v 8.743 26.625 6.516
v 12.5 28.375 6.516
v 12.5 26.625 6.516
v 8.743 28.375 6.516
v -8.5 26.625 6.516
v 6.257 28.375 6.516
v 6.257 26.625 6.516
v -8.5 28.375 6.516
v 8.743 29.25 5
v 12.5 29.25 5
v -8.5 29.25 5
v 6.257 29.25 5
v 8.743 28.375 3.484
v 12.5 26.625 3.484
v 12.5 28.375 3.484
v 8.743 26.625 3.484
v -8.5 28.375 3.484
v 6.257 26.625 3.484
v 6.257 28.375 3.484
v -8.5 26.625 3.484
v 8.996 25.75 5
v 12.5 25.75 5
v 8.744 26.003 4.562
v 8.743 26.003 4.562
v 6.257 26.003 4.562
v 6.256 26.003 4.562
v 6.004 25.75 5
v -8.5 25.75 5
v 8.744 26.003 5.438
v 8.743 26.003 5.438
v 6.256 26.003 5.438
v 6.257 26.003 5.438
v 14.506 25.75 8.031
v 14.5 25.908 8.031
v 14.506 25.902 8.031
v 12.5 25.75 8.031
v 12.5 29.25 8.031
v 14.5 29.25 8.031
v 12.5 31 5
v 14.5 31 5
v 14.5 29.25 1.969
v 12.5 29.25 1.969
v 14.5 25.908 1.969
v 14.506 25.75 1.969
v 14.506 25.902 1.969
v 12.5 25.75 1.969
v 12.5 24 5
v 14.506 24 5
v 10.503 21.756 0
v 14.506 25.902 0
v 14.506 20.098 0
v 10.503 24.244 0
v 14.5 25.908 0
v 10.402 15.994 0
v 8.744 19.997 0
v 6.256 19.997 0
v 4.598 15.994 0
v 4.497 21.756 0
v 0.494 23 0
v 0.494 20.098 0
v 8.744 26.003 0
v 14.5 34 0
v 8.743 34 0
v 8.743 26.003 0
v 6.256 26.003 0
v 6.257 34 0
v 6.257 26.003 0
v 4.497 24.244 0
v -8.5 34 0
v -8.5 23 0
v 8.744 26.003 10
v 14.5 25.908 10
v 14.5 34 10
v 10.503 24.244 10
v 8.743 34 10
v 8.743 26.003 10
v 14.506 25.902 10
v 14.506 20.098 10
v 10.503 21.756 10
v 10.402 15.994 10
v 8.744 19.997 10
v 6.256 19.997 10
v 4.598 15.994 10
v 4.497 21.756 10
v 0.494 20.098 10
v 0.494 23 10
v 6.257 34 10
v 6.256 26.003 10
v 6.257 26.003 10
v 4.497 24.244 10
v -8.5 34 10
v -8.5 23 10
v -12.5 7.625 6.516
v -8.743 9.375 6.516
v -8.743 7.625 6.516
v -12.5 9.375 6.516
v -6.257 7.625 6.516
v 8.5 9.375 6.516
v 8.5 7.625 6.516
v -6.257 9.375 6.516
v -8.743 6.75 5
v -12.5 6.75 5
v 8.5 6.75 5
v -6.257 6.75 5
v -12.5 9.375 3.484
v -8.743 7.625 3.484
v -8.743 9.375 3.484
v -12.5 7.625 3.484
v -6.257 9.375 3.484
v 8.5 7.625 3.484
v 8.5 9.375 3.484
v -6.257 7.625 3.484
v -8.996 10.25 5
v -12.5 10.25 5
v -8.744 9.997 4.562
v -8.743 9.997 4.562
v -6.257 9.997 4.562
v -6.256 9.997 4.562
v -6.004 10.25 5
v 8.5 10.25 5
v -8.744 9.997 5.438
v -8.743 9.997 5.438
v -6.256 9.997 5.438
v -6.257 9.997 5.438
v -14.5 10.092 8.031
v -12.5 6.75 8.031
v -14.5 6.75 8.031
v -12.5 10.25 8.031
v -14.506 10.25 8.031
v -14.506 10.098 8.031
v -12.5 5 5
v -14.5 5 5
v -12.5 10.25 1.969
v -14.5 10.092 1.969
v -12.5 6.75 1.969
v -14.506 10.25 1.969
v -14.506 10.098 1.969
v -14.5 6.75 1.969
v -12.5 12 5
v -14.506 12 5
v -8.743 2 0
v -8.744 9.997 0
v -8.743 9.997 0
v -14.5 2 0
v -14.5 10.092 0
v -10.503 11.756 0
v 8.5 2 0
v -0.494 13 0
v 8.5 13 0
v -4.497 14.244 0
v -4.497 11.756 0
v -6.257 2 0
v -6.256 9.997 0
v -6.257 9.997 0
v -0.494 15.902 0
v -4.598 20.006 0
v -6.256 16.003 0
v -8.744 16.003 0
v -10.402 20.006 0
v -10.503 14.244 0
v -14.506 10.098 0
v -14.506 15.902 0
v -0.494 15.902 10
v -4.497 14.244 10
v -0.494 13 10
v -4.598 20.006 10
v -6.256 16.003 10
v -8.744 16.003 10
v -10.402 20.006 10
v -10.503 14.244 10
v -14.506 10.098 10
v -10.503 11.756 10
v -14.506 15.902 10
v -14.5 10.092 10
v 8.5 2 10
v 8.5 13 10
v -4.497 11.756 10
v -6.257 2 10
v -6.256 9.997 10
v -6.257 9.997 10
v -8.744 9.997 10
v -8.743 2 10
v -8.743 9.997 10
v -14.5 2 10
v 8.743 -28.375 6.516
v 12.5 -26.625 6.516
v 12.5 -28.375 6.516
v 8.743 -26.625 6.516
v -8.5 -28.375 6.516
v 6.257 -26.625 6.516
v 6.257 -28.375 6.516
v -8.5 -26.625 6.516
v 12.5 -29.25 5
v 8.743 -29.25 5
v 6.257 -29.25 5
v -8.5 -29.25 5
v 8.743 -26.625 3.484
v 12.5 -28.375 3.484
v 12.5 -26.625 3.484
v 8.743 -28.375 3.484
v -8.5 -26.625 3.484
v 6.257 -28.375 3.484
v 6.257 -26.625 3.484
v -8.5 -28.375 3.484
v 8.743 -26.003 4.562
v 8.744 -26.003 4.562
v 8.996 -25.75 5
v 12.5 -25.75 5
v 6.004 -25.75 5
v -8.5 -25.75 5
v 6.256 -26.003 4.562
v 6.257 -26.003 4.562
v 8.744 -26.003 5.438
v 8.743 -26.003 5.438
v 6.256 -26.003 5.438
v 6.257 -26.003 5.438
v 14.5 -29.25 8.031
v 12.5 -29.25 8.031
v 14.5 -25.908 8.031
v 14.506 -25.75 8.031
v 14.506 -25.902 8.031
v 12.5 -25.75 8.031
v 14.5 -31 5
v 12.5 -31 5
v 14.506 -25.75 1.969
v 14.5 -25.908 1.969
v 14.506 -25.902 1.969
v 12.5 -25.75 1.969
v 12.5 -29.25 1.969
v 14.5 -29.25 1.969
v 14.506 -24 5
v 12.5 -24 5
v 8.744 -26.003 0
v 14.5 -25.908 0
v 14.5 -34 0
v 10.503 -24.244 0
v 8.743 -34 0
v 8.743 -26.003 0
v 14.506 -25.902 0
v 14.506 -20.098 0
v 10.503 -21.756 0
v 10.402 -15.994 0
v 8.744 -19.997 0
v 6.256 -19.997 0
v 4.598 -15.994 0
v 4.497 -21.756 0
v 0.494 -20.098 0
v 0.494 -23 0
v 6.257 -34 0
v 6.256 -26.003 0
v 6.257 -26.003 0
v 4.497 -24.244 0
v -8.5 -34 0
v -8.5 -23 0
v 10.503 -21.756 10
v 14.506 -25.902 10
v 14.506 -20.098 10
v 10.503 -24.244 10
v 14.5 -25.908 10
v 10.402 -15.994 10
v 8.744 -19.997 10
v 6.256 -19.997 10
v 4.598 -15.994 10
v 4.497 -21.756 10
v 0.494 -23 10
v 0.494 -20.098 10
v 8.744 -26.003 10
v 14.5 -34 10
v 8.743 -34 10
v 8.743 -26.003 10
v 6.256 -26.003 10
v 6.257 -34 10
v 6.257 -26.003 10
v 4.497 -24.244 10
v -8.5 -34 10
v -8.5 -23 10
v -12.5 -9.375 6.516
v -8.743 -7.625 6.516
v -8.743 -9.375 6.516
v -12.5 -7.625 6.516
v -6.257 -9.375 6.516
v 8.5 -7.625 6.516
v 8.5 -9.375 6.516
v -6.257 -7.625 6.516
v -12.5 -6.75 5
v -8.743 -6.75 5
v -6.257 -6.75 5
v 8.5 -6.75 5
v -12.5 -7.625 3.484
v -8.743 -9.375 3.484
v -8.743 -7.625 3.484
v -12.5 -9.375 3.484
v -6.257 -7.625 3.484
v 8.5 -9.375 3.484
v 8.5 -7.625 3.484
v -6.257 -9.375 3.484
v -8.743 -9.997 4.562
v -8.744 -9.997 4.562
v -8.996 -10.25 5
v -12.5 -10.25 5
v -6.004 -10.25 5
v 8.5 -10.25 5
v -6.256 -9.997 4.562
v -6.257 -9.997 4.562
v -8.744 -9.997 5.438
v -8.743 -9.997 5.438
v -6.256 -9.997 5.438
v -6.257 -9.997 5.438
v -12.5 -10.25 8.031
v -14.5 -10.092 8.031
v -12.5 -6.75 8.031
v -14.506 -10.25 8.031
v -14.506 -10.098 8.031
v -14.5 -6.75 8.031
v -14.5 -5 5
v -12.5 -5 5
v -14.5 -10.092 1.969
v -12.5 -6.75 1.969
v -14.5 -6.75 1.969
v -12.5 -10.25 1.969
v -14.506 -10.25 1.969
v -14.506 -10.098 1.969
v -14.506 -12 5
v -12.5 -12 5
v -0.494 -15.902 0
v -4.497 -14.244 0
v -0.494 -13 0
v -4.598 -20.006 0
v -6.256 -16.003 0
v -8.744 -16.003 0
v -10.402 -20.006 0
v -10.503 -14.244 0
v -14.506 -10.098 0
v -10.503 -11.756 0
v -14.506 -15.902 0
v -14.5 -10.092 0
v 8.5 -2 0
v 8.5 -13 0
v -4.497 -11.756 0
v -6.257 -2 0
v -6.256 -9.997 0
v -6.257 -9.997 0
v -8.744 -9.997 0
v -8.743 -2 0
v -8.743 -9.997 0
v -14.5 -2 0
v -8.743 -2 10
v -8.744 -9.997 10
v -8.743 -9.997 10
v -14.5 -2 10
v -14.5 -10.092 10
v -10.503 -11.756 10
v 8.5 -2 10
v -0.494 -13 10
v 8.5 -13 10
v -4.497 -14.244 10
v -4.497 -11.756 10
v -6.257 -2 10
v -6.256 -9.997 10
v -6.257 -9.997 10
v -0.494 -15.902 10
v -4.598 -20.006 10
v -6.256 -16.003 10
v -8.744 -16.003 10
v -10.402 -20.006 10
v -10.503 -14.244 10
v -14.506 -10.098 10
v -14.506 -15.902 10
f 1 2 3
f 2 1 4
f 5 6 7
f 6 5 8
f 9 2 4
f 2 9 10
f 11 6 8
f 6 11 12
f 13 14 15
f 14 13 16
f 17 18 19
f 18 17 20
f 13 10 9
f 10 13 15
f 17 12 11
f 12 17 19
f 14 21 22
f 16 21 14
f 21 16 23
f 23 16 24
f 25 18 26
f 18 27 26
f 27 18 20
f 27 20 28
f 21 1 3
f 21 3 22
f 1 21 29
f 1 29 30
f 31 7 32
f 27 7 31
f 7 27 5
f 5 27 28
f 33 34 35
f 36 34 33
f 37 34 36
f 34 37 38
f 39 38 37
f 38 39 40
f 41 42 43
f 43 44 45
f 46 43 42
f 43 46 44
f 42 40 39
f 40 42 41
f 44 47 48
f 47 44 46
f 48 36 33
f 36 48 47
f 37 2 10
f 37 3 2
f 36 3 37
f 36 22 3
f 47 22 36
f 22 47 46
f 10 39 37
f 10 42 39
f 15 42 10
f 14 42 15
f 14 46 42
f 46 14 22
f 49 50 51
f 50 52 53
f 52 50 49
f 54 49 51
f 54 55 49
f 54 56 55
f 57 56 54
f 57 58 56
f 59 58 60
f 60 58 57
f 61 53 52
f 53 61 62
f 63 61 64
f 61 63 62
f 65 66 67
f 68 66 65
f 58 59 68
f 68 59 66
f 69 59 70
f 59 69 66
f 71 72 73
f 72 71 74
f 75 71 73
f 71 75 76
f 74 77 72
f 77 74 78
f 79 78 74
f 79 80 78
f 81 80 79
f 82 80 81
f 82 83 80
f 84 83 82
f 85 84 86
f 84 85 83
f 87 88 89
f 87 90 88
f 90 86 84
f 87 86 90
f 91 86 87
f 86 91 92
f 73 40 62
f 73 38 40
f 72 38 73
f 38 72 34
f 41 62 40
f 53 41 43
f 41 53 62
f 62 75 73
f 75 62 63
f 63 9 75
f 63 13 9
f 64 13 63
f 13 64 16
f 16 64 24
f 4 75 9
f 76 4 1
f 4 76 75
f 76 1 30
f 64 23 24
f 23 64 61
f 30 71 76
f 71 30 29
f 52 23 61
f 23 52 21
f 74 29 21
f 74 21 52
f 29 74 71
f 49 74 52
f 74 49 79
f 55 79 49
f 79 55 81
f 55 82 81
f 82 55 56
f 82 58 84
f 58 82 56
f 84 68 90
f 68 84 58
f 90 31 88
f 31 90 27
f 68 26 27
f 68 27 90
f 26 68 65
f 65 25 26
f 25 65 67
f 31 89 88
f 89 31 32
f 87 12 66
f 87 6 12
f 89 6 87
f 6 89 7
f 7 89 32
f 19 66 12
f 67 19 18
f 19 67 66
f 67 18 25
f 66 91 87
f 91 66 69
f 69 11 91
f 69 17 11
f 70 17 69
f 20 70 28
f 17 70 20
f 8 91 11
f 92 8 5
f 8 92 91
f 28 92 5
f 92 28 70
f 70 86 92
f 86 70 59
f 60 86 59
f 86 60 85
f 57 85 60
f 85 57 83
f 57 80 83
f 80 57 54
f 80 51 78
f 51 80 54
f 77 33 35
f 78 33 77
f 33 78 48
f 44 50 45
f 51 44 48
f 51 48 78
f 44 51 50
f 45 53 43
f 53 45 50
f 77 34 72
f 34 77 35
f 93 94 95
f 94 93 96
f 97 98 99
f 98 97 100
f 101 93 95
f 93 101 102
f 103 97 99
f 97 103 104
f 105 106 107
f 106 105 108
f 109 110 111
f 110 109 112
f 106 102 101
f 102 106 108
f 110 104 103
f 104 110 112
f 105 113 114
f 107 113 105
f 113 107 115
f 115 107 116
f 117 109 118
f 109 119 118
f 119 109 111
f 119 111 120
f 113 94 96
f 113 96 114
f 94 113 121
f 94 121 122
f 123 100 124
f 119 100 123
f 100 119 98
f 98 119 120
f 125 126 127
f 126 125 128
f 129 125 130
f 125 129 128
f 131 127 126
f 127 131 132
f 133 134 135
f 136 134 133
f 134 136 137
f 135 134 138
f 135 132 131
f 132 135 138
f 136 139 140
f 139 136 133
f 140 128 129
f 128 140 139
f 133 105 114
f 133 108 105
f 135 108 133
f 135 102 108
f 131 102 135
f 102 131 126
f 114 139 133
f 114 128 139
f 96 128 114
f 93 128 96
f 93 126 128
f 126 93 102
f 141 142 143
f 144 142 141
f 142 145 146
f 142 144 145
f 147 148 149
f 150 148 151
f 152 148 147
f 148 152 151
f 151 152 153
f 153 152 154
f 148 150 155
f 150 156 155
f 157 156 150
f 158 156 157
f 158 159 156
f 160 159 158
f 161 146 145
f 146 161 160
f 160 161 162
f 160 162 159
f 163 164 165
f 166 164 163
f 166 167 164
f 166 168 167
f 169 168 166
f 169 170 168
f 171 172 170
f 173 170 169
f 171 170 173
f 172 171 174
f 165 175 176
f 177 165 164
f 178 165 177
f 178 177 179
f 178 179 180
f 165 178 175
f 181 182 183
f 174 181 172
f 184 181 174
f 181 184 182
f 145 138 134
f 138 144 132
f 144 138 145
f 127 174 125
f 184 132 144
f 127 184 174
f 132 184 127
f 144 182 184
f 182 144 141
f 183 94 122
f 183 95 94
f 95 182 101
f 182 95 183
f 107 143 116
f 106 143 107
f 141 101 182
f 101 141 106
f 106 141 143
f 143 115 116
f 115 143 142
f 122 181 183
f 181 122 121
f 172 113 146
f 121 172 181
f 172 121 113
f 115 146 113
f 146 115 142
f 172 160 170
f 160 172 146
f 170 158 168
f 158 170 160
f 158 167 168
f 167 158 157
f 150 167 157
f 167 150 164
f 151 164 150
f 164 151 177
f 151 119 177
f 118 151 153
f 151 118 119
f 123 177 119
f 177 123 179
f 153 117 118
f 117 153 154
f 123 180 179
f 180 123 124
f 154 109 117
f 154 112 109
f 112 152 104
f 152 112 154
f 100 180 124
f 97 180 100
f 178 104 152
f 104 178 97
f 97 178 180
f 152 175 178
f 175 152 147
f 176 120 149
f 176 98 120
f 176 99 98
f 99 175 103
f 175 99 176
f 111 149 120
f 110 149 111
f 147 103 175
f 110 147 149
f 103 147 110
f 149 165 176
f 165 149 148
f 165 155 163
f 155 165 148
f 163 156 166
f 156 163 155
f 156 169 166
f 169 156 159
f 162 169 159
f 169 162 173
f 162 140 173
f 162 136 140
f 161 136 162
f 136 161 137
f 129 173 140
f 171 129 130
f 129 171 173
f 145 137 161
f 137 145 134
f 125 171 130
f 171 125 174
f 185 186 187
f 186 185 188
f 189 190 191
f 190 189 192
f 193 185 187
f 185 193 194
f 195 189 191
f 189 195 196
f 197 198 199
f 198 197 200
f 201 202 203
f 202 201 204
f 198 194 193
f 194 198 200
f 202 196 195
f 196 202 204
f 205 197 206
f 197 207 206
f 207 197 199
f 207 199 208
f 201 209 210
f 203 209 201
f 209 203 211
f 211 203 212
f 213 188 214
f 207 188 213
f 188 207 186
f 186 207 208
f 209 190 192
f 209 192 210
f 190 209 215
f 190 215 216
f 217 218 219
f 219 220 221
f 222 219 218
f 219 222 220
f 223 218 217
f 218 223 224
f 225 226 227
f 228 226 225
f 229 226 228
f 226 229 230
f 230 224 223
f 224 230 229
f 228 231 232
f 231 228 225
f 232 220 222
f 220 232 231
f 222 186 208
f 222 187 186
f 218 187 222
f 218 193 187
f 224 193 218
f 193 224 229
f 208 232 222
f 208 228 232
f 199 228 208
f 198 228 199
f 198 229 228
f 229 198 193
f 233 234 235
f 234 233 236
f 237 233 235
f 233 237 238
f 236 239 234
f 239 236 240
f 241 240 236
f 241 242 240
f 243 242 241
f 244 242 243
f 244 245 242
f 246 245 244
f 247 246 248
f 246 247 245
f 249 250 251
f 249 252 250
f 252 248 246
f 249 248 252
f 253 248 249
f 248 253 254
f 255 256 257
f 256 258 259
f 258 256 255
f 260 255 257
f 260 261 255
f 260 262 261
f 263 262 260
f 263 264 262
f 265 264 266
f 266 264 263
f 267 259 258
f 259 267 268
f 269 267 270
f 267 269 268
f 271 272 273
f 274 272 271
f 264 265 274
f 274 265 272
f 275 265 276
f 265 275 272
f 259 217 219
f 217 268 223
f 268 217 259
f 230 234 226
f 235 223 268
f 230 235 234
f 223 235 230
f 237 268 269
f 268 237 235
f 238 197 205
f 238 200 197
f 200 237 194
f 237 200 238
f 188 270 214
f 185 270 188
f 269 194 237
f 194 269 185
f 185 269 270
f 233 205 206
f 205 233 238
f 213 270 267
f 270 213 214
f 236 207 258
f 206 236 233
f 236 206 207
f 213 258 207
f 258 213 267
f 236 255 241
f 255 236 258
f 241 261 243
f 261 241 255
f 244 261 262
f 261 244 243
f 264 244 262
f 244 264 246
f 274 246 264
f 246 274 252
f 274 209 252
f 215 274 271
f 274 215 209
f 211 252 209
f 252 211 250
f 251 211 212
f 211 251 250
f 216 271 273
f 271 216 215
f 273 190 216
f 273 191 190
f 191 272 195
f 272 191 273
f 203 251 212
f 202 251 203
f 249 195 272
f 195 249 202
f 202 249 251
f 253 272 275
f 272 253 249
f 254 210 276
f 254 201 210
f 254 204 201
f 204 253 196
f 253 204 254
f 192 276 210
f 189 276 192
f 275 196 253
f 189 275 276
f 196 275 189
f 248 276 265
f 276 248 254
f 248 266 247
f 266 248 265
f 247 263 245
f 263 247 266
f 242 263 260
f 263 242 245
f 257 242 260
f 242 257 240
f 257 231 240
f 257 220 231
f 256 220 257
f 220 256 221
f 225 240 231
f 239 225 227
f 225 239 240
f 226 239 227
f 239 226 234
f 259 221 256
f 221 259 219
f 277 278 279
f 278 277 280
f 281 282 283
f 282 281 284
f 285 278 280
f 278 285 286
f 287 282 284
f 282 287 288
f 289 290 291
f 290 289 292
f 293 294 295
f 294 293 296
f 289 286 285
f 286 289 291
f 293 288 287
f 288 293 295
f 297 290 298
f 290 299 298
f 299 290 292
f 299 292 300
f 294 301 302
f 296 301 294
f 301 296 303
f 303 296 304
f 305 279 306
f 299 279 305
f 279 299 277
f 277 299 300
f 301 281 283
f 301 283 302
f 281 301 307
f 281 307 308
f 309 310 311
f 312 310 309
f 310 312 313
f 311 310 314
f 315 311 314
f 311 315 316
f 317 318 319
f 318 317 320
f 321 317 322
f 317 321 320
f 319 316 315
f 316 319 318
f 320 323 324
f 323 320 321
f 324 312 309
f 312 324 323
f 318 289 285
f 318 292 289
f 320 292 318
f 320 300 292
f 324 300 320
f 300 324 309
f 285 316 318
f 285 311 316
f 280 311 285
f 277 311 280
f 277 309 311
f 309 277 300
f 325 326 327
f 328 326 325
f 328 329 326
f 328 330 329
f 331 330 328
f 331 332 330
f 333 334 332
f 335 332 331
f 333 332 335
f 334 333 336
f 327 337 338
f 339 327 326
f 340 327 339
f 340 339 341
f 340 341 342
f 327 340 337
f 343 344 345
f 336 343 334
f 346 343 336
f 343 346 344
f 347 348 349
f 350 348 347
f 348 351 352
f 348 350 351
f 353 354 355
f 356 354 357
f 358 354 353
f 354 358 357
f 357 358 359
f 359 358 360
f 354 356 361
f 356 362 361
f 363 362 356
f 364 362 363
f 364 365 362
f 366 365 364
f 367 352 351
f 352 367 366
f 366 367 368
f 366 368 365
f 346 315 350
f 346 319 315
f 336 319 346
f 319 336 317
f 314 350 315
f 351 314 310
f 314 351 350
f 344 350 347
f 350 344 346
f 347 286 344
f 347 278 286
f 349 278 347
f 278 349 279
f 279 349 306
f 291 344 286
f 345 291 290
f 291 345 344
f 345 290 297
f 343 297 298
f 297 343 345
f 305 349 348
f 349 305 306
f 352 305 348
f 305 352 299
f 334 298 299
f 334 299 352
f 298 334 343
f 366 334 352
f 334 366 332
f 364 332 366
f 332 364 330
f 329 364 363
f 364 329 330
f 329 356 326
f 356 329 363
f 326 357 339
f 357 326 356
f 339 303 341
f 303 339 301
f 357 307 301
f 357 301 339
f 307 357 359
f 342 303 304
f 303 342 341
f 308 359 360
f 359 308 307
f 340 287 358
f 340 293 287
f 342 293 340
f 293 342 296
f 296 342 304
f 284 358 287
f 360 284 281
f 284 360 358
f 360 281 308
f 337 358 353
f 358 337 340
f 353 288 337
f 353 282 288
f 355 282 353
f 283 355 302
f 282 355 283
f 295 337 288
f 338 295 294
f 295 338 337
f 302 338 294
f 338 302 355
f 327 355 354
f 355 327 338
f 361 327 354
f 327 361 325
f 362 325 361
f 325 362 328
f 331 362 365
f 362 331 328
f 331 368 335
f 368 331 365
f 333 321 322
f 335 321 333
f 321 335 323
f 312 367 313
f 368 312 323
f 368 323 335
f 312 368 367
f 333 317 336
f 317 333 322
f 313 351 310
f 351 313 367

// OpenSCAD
// file: configuration.scad
// default configuration
// m6 rods and nema14 motors

rod_size = 6;
rod_nut_size = 12; //12 for M6, 16 for M8
bearing_size = 12.5; //12 for LM6UU, 15 for LM8UU,LM8SUU
bearing_length = 20; //19 for LM6UU, 17 for LM8SUU, 24 for LM8UU
yz_motor_distance = 25;
motor_screw_spacing = 26; //26 for NEMA14, 31 for NEMA17
motor_casing = 38; //38 for NEMA14, 45 for NEMA17
end_height = 40;
bed_mount_height = 16;
//x_rod_spacing = motor_screw_spacing + 3 + rod_size;
x_rod_spacing = 30;
x_carriage_width = 70;
carriage_extruder_offset = 5;
pulley_size = 20;
idler_pulley_width = 10;
gusset_size = 15;
// main file
//bed mount

include <configuration.scad>



module bed_mount() difference() {
	linear_extrude(height = 10, convexity = 5) difference() {
		union() {
			rotate(180 / 8) circle((rod_size + 8) * 13/24, $fn = 8);
			translate([0, -rod_size / 2 - 4, 0]) square([rod_size / 2 + 8, max(rod_size + 8, rod_size / 2 + 4 + bed_mount_height)]);
		}
		rotate(180 / 8) circle(rod_size * 13/24, $fn = 8);
		translate([0, -rod_size / (1 + sqrt(2)) / 2, 0]) square([rod_size + 10, rod_size / (1 + sqrt(2))]);
	}
	translate([rod_size / 2 + 1.5, -rod_size / 2 - 6, 5]) rotate([-90, 0, 0]) {
		cylinder(r = 3 * 7/12, h = max(rod_size + 12, rod_size / 2 + 7 + bed_mount_height, $fn = 6));
		cylinder(r = 3 * 7/6, h = 4, $fn = 6);
	}
}

for(b = [0:1]) mirror([0, b, 0]) for(a = [-1,1]) translate([a * -7.5, 18 - 5 * a, 0]) rotate(180 + 90 * a) bed_mount();
